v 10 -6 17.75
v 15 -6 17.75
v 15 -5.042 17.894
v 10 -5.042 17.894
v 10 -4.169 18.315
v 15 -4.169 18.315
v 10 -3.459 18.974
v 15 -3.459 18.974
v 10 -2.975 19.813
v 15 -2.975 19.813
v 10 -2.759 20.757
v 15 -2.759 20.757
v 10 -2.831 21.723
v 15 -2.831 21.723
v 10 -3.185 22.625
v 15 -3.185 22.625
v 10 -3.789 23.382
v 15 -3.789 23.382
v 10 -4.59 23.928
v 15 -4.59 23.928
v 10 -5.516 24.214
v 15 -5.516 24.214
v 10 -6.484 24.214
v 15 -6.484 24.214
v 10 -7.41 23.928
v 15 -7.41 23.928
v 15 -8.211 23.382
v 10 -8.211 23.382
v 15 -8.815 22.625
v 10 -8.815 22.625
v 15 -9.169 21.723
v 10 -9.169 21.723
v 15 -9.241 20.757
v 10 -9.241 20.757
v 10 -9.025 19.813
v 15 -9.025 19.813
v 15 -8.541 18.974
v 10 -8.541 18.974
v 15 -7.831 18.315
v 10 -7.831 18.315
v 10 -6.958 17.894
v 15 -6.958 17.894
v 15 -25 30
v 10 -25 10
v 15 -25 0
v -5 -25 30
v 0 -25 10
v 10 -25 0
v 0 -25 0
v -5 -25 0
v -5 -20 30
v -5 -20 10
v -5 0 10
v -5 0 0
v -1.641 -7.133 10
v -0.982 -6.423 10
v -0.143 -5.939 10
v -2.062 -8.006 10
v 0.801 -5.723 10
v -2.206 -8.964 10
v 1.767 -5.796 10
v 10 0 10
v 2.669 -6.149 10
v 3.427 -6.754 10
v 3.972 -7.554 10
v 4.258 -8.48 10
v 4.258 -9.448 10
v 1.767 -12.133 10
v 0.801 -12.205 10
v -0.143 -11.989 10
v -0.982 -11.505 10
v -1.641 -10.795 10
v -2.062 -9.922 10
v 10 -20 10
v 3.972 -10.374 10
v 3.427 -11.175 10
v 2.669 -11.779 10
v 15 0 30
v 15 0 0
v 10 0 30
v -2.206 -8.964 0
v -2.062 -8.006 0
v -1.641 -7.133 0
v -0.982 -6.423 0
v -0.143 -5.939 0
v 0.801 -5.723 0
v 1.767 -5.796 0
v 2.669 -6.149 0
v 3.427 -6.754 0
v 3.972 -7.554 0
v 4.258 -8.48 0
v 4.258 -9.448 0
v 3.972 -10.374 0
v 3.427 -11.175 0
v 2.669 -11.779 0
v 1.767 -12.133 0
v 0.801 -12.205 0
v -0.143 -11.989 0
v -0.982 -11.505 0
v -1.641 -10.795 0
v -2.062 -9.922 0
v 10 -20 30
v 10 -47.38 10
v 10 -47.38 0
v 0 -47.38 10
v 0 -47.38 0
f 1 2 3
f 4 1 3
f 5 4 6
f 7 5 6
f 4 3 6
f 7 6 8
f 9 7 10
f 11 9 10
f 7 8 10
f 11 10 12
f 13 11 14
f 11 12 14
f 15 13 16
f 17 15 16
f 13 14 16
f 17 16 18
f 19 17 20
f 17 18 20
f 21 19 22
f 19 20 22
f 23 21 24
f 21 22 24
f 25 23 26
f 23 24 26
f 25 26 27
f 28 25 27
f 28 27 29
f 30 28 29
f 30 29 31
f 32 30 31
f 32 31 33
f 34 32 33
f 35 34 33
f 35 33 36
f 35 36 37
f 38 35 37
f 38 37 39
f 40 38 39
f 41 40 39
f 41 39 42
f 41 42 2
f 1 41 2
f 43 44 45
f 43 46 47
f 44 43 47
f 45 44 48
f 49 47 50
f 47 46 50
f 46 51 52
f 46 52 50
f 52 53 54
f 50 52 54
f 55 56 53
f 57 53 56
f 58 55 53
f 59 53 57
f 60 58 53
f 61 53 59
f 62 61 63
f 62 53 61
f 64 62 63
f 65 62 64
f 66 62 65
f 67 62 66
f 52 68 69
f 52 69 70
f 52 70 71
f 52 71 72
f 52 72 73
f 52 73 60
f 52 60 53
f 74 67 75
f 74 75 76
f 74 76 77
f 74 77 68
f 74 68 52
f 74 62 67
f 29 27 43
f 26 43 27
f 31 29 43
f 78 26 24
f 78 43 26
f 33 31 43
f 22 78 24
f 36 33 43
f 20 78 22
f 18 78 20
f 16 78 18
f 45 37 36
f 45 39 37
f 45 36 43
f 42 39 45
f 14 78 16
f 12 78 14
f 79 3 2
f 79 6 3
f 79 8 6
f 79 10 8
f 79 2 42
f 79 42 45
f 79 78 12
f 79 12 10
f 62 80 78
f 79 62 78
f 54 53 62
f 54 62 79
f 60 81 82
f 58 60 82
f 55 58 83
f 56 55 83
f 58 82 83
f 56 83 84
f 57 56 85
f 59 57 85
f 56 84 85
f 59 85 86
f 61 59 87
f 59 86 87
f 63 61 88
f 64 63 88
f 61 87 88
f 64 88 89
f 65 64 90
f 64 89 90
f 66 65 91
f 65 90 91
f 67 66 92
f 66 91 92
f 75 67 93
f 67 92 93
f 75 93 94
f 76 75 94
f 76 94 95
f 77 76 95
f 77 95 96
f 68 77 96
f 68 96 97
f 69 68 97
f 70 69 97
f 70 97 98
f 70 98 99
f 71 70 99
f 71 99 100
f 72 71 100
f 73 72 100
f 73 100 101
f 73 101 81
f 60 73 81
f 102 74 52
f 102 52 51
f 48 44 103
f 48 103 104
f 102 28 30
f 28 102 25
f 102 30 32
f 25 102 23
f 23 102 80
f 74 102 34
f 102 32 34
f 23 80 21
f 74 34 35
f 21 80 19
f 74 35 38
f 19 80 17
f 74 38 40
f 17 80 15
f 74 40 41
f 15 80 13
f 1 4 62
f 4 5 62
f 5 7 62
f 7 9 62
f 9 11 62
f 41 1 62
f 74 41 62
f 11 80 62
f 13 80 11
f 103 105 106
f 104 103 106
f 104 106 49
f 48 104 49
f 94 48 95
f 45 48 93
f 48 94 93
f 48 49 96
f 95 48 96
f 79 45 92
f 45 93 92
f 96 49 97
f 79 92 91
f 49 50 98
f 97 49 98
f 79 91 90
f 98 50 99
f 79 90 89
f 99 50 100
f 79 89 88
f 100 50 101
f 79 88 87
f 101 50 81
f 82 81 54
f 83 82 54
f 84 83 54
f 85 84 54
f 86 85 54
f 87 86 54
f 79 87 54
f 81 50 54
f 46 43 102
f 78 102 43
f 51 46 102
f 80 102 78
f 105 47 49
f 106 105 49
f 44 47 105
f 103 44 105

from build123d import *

# Parameters (mm, degrees)
BOSS_EXTRUDE1_DEPTH     = 10
BOSS_EXTRUDE5_DEPTH     = 5
SKETCH3_W               = 30
SKETCH3_H               = 25
BOSS_EXTRUDE6_DEPTH     = 5
SKETCH4_R               = 3.25
CUT_EXTRUDE1_DEPTH      = 22
CUT_EXTRUDE1_DEPTH_BACK = 17
SKETCH5_R               = 3.25
CUT_EXTRUDE2_DEPTH      = 16
CUT_EXTRUDE2_DEPTH_BACK = 20


with BuildPart() as part:
    # Sketch1 → Boss-Extrude1 (new body)
    with BuildSketch(Plane(origin=(0, 0, 0), x_dir=(0, 0, -1), z_dir=(1, 0, 0))):
        Polygon((0, 0), (-10, 0), (-10, -20), (-30, -20), (-30, -25), (-10, -25), (-10, -47.38), (0, -47.38), align=None)
    extrude(amount=BOSS_EXTRUDE1_DEPTH)

    # Sketch2 → Boss-Extrude5 (add)
    with BuildSketch(Plane.ZY):
        Polygon((0, 0), (10, 0), (10, -20), (30, -20), (30, -25), (0, -25), align=None)
    extrude(amount=BOSS_EXTRUDE5_DEPTH)

    # Sketch3 → Boss-Extrude6 (add)
    with BuildSketch(Plane(origin=(10, 0, 0), x_dir=(0, 0, -1), z_dir=(1, 0, 0))):
        with Locations((-15, -12.5)):
            Rectangle(SKETCH3_W, SKETCH3_H)
    extrude(amount=BOSS_EXTRUDE6_DEPTH)

    # Sketch4 → Cut-Extrude1 (cut, two sides)
    with BuildSketch(Plane(origin=(0, 0, 0), x_dir=(-1, 0, 0), z_dir=(0, 0, -1))) as cut_extrude1_sk:
        with Locations((-1.044087289, -8.964075593)):
            Circle(SKETCH4_R)
    extrude(amount=CUT_EXTRUDE1_DEPTH, mode=Mode.SUBTRACT)
    extrude(cut_extrude1_sk.sketch, amount=-CUT_EXTRUDE1_DEPTH_BACK, mode=Mode.SUBTRACT)

    # Sketch5 → Cut-Extrude2 (cut, two sides)
    with BuildSketch(Plane(origin=(15, 0, 0), x_dir=(0, 0, -1), z_dir=(1, 0, 0))) as cut_extrude2_sk:
        with Locations((-21, -6)):
            Circle(SKETCH5_R)
    extrude(amount=CUT_EXTRUDE2_DEPTH, mode=Mode.SUBTRACT)
    extrude(cut_extrude2_sk.sketch, amount=-CUT_EXTRUDE2_DEPTH_BACK, mode=Mode.SUBTRACT)


solid = part.part
